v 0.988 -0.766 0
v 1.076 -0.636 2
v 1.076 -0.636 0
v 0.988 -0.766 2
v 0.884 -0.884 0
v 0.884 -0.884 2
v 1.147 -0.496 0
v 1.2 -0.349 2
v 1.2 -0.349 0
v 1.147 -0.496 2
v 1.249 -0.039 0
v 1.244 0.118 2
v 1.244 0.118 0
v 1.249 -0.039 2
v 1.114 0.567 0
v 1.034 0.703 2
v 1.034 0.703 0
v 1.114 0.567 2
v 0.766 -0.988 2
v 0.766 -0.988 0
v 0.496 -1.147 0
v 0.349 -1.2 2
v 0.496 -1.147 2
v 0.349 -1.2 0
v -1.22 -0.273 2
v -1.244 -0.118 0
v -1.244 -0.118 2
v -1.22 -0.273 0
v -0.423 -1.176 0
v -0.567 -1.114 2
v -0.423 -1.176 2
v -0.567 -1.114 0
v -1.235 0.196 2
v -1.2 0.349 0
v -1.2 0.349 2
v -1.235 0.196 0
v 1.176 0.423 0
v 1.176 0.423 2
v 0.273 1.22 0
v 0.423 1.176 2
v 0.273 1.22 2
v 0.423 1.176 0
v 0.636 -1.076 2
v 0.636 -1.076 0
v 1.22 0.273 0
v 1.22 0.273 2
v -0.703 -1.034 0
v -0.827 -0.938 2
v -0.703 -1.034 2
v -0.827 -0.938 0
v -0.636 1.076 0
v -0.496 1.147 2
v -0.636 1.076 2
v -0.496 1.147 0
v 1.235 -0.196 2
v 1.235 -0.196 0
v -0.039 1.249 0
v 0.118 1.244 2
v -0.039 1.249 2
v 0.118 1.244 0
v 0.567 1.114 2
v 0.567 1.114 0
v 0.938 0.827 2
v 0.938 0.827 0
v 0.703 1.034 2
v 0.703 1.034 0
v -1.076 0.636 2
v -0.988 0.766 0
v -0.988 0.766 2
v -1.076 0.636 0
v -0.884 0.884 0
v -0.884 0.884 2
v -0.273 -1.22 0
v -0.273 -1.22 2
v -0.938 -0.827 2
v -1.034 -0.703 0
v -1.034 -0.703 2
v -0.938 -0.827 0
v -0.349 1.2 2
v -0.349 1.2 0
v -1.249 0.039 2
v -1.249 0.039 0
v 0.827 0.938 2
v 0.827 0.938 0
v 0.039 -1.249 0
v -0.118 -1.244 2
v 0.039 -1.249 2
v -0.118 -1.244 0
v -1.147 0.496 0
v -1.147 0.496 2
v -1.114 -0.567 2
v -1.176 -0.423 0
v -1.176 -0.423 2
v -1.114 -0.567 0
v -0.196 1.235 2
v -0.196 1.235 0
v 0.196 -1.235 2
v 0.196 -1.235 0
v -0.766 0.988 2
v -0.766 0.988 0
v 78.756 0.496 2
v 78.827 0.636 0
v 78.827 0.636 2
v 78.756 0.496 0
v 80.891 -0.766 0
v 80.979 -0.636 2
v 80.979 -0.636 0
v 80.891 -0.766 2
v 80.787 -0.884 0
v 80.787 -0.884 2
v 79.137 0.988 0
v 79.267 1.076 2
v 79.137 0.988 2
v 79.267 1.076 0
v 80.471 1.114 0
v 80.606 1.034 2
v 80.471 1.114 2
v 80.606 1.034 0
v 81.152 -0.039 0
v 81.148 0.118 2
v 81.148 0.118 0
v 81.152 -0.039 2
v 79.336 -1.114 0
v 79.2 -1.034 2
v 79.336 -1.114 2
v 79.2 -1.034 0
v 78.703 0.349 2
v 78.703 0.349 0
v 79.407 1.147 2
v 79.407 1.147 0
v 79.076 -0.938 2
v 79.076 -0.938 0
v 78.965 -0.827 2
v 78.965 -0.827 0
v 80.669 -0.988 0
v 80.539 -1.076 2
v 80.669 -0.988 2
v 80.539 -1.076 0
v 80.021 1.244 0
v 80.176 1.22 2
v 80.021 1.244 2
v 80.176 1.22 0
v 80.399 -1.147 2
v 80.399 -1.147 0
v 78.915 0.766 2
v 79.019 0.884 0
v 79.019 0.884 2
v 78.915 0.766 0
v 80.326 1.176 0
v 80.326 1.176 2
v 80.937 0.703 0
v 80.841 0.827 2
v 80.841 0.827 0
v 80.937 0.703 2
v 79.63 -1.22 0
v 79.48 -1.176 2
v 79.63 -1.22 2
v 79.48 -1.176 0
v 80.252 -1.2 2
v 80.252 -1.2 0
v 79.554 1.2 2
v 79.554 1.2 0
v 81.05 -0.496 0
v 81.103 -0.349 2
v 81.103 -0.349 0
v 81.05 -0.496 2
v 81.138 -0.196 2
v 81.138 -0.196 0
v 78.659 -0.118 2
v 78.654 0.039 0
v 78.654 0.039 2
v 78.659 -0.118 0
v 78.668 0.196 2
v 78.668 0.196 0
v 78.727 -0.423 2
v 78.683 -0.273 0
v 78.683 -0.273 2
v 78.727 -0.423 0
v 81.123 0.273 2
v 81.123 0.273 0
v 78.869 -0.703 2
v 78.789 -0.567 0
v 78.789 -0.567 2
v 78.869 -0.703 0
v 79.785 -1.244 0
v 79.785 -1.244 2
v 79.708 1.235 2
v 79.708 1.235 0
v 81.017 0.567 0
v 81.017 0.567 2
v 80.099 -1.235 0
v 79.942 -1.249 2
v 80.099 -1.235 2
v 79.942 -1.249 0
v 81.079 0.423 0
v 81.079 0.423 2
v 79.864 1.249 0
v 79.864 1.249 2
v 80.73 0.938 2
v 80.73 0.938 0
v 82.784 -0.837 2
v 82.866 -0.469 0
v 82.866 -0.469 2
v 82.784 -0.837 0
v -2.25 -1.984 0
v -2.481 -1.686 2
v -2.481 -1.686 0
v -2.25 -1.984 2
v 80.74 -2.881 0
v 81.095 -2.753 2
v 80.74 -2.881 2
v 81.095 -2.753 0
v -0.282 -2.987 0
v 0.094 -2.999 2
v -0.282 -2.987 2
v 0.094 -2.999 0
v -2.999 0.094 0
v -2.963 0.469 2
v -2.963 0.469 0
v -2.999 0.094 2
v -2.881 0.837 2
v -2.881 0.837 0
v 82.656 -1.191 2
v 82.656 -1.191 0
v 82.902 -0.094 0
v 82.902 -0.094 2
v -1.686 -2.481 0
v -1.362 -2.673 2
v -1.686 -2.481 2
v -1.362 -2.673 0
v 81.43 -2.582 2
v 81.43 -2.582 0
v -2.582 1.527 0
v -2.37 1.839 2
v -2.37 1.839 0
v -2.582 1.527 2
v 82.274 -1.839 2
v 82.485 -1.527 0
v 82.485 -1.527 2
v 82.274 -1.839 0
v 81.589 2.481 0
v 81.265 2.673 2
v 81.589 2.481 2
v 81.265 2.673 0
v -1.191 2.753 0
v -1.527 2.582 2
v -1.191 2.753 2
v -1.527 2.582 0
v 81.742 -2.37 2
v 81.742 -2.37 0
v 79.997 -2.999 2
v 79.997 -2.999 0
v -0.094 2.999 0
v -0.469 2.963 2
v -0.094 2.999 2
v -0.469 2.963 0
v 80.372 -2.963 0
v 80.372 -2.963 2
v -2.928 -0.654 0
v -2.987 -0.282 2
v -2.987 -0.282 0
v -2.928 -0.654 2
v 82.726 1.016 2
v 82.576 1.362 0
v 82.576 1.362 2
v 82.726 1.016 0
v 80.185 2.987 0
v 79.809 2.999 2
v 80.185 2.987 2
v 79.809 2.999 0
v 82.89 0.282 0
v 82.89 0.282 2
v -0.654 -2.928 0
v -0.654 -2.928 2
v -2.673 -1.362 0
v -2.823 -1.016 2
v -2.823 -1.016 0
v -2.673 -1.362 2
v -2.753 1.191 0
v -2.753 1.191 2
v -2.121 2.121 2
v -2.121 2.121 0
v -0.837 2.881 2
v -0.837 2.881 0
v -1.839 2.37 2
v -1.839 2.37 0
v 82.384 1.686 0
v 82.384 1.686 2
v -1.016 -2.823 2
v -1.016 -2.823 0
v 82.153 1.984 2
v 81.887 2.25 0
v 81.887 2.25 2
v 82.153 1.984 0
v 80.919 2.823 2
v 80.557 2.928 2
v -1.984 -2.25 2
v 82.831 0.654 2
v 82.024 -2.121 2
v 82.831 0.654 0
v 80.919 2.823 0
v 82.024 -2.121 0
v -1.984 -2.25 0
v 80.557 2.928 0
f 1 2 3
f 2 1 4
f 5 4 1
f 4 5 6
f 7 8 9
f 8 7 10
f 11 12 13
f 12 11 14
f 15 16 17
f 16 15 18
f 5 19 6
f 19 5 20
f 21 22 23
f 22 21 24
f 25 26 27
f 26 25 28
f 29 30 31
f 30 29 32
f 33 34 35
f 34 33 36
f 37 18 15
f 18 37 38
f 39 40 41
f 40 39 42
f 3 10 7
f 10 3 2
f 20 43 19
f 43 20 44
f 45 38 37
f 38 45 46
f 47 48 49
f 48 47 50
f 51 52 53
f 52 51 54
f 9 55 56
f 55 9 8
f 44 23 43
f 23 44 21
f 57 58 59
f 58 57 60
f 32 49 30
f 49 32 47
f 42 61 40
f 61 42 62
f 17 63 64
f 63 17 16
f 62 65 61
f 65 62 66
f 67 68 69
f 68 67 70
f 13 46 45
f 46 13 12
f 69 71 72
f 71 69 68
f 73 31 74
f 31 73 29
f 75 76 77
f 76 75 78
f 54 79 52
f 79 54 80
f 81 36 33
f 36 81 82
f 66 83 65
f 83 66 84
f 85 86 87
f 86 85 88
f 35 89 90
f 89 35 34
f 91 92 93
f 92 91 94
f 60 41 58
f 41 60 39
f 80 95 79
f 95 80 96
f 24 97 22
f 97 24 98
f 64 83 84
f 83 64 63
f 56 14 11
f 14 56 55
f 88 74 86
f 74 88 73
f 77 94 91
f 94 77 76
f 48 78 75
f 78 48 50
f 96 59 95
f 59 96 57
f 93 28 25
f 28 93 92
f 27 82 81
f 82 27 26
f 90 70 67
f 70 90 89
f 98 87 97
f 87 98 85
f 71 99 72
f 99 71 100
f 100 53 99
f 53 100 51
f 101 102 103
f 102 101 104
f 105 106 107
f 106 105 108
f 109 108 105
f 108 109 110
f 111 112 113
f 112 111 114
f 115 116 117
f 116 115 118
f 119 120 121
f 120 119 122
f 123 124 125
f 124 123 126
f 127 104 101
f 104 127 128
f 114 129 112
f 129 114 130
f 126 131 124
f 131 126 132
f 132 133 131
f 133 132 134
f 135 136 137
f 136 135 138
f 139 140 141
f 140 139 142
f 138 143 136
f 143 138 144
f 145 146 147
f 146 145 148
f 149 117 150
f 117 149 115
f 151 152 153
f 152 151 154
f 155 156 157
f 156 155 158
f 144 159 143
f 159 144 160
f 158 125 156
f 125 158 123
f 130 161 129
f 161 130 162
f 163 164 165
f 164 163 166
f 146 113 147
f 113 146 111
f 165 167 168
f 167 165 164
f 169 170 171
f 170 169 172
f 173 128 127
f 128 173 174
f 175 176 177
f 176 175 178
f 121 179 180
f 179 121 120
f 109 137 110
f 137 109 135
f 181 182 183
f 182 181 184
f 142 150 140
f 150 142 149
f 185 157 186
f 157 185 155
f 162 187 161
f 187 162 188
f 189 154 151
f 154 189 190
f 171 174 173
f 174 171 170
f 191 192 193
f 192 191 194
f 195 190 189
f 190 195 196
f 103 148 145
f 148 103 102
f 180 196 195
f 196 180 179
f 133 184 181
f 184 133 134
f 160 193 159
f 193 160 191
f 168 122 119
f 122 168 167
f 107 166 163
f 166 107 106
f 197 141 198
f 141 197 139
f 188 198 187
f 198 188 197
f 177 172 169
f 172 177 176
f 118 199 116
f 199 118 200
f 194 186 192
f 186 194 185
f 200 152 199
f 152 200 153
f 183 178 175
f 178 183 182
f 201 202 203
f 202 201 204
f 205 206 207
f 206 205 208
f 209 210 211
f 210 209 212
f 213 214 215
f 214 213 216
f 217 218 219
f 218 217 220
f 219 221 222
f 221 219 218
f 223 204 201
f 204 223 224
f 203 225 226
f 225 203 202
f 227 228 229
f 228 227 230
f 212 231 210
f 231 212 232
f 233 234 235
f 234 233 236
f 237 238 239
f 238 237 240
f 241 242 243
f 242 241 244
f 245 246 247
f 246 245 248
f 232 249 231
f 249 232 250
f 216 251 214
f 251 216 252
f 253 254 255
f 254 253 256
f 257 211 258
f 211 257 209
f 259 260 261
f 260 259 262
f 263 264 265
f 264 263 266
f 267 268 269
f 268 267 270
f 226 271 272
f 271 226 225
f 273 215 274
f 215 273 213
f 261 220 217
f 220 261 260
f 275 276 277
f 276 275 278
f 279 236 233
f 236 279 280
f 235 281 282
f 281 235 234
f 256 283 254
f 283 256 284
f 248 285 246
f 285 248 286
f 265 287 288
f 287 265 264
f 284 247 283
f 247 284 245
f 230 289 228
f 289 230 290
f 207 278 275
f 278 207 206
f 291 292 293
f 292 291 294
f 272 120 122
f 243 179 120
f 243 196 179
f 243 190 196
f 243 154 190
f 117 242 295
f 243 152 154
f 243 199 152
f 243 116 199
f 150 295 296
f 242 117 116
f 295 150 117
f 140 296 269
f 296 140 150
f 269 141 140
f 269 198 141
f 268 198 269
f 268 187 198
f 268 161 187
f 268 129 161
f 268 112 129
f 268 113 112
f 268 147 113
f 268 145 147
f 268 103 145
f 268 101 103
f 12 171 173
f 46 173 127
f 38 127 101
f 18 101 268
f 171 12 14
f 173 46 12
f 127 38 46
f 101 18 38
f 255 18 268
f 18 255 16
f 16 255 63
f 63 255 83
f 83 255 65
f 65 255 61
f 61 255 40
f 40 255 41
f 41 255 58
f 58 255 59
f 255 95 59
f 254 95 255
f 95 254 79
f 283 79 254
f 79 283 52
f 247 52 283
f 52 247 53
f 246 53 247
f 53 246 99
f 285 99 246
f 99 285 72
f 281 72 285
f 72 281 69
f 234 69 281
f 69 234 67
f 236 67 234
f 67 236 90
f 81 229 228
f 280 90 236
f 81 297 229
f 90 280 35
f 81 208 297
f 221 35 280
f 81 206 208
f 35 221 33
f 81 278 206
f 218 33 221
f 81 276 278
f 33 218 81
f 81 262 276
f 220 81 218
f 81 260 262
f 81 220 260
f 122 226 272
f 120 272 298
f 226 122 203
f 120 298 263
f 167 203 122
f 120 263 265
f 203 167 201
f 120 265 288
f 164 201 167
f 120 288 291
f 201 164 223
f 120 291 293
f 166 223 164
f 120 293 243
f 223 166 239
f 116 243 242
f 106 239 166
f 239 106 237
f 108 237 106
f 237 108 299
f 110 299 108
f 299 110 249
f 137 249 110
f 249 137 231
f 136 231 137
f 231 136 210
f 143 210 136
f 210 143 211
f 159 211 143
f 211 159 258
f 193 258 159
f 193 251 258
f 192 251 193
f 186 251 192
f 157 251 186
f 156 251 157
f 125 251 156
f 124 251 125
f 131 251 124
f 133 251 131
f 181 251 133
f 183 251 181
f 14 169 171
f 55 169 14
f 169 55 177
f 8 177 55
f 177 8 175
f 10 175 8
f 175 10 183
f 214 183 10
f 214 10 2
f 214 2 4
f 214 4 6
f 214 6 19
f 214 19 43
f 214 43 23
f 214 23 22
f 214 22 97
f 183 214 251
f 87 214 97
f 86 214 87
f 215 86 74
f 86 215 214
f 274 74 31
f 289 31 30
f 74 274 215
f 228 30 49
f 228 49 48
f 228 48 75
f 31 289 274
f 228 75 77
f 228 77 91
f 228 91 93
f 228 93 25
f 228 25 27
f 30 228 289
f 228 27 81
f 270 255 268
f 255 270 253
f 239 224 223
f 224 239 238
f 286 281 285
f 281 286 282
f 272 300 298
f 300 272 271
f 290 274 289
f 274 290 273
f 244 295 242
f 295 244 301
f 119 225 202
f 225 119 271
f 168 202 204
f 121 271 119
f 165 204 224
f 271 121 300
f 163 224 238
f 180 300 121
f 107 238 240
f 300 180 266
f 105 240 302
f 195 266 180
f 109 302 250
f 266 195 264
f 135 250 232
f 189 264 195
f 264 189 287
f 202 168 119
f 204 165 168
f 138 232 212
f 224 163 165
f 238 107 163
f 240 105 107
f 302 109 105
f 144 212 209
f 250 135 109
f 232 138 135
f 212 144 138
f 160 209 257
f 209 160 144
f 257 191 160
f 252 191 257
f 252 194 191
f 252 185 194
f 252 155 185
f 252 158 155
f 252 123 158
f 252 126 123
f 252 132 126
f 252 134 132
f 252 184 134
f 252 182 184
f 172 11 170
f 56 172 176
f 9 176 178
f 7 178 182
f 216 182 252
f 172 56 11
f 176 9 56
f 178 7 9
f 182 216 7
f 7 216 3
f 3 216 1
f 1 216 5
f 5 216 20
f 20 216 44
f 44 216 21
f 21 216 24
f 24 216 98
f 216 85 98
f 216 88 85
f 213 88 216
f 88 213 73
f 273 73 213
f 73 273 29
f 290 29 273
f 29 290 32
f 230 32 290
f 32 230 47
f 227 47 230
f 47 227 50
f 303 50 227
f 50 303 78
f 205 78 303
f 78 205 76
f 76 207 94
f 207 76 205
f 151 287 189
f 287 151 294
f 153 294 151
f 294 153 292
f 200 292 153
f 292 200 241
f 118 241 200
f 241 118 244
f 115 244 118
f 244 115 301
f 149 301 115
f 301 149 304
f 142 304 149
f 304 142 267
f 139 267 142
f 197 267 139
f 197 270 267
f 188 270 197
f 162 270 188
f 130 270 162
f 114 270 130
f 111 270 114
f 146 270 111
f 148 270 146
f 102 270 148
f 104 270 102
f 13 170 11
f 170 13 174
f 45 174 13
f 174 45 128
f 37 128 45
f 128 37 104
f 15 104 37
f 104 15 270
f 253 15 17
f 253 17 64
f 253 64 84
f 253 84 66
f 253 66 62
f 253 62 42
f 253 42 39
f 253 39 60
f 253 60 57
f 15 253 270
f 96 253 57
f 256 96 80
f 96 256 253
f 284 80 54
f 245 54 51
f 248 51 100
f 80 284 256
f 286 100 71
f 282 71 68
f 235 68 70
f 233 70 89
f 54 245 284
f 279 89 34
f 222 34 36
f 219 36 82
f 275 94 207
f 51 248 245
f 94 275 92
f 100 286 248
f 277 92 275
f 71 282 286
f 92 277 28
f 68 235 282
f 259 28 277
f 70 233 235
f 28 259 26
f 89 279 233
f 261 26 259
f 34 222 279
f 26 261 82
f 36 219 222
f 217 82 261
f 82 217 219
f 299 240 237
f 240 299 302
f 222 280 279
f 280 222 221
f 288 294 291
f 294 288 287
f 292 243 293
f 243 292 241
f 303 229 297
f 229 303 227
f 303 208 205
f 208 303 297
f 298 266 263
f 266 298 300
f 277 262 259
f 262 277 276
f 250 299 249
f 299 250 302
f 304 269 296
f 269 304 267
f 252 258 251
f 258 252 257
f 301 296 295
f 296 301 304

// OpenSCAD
thickness = 2;
hub_width = 52.5;
hub_height = 14;
corner = 7;
delta = 7;
top_screw_diameter = 2;
bottom_screw_diameter = 3.2;
bottom_screw_count = 5;

module usb_hub_holder() {
    difference() {
        union() {
            difference() {
                union() {
                    cube([hub_width + thickness * 2, hub_width + thickness * 2, hub_height + thickness]);
                    cylinder(d = top_screw_diameter + thickness * 2, h = hub_height + thickness, $fn = 50);
                    translate([hub_width + thickness * 2, hub_width + thickness * 2, 0]) {
                        cylinder(d = top_screw_diameter + thickness * 2, h = hub_height + thickness, $fn = 50);
                    }
                }
                translate([thickness, thickness, thickness]) {
                    cube([hub_width, hub_width, hub_height + 1]);
                }
                translate([corner, -corner + thickness * 2, -0.1]) {
                    cube([hub_width, hub_width, hub_height + thickness * 2]);
                }
                translate([-corner + thickness * 2, corner, -0.1]) {
                    cube([hub_width, hub_width, hub_height + thickness * 2]);
                }
            }
            hull() {
                translate([hub_width + thickness * 2, hub_width + thickness * 2, 0]) {
                    cylinder(d = top_screw_diameter + thickness * 2, h = thickness, $fn = 50);
                }
                translate([-delta, -delta, 0]) {
                    cylinder(d = top_screw_diameter + thickness * 2, h = thickness, $fn = 50);
                }
            }
            translate([-delta, -delta, 0]) {
                rotate([0, 0, -45]) {
                    hull() {
                        translate([-10 * floor(bottom_screw_count  / 2), 0, 0]) {
                            cylinder(d = bottom_screw_diameter + thickness * 2, h = thickness, $fn = 50);
                        }
                        translate([10 * floor(bottom_screw_count  / 2), 0, 0]) {
                            cylinder(d = bottom_screw_diameter + thickness * 2, h = thickness, $fn = 50);
                        }
                    }
                }
            }
        }
        translate([0, 0, -0.1]) {
            cylinder(d = top_screw_diameter, h = hub_height + thickness + 1, $fn = 50);
            translate([hub_width + thickness * 2, hub_width + thickness * 2, 0]) {
                cylinder(d = top_screw_diameter, h = hub_height + thickness + 1, $fn = 50);
            }
        }
        translate([-delta, -delta, -0.1]) {
            rotate([0, 0, -45]) {
                for (i = [-floor(bottom_screw_count  / 2) : floor(bottom_screw_count  / 2)]) {
                    translate([-10 * i, 0, 0]) {
                        cylinder(d = bottom_screw_diameter, h = thickness + 1, $fn = 50);
                    }
                }
            }
        }
    }
}

module cover_plate() {
    difference() {
        hull() {
            translate([hub_width + thickness * 2, hub_width + thickness * 2, 0]) {
                cylinder(d = top_screw_diameter + thickness * 2, h = thickness, $fn = 50);
            }
            cylinder(d = top_screw_diameter + thickness * 2, h = thickness, $fn = 50);
        }
        translate([0, 0, -0.1]) {
            cylinder(d = top_screw_diameter + 0.5, h = hub_height + thickness + 1, $fn = 50);
            translate([hub_width + thickness * 2, hub_width + thickness * 2, 0]) {
                cylinder(d = top_screw_diameter + 0.5, h = hub_height + thickness + 1, $fn = 50);
            }
        }
    }
}

rotate([0, 0, -45]) {
    //usb_hub_holder();
    cover_plate();
}
